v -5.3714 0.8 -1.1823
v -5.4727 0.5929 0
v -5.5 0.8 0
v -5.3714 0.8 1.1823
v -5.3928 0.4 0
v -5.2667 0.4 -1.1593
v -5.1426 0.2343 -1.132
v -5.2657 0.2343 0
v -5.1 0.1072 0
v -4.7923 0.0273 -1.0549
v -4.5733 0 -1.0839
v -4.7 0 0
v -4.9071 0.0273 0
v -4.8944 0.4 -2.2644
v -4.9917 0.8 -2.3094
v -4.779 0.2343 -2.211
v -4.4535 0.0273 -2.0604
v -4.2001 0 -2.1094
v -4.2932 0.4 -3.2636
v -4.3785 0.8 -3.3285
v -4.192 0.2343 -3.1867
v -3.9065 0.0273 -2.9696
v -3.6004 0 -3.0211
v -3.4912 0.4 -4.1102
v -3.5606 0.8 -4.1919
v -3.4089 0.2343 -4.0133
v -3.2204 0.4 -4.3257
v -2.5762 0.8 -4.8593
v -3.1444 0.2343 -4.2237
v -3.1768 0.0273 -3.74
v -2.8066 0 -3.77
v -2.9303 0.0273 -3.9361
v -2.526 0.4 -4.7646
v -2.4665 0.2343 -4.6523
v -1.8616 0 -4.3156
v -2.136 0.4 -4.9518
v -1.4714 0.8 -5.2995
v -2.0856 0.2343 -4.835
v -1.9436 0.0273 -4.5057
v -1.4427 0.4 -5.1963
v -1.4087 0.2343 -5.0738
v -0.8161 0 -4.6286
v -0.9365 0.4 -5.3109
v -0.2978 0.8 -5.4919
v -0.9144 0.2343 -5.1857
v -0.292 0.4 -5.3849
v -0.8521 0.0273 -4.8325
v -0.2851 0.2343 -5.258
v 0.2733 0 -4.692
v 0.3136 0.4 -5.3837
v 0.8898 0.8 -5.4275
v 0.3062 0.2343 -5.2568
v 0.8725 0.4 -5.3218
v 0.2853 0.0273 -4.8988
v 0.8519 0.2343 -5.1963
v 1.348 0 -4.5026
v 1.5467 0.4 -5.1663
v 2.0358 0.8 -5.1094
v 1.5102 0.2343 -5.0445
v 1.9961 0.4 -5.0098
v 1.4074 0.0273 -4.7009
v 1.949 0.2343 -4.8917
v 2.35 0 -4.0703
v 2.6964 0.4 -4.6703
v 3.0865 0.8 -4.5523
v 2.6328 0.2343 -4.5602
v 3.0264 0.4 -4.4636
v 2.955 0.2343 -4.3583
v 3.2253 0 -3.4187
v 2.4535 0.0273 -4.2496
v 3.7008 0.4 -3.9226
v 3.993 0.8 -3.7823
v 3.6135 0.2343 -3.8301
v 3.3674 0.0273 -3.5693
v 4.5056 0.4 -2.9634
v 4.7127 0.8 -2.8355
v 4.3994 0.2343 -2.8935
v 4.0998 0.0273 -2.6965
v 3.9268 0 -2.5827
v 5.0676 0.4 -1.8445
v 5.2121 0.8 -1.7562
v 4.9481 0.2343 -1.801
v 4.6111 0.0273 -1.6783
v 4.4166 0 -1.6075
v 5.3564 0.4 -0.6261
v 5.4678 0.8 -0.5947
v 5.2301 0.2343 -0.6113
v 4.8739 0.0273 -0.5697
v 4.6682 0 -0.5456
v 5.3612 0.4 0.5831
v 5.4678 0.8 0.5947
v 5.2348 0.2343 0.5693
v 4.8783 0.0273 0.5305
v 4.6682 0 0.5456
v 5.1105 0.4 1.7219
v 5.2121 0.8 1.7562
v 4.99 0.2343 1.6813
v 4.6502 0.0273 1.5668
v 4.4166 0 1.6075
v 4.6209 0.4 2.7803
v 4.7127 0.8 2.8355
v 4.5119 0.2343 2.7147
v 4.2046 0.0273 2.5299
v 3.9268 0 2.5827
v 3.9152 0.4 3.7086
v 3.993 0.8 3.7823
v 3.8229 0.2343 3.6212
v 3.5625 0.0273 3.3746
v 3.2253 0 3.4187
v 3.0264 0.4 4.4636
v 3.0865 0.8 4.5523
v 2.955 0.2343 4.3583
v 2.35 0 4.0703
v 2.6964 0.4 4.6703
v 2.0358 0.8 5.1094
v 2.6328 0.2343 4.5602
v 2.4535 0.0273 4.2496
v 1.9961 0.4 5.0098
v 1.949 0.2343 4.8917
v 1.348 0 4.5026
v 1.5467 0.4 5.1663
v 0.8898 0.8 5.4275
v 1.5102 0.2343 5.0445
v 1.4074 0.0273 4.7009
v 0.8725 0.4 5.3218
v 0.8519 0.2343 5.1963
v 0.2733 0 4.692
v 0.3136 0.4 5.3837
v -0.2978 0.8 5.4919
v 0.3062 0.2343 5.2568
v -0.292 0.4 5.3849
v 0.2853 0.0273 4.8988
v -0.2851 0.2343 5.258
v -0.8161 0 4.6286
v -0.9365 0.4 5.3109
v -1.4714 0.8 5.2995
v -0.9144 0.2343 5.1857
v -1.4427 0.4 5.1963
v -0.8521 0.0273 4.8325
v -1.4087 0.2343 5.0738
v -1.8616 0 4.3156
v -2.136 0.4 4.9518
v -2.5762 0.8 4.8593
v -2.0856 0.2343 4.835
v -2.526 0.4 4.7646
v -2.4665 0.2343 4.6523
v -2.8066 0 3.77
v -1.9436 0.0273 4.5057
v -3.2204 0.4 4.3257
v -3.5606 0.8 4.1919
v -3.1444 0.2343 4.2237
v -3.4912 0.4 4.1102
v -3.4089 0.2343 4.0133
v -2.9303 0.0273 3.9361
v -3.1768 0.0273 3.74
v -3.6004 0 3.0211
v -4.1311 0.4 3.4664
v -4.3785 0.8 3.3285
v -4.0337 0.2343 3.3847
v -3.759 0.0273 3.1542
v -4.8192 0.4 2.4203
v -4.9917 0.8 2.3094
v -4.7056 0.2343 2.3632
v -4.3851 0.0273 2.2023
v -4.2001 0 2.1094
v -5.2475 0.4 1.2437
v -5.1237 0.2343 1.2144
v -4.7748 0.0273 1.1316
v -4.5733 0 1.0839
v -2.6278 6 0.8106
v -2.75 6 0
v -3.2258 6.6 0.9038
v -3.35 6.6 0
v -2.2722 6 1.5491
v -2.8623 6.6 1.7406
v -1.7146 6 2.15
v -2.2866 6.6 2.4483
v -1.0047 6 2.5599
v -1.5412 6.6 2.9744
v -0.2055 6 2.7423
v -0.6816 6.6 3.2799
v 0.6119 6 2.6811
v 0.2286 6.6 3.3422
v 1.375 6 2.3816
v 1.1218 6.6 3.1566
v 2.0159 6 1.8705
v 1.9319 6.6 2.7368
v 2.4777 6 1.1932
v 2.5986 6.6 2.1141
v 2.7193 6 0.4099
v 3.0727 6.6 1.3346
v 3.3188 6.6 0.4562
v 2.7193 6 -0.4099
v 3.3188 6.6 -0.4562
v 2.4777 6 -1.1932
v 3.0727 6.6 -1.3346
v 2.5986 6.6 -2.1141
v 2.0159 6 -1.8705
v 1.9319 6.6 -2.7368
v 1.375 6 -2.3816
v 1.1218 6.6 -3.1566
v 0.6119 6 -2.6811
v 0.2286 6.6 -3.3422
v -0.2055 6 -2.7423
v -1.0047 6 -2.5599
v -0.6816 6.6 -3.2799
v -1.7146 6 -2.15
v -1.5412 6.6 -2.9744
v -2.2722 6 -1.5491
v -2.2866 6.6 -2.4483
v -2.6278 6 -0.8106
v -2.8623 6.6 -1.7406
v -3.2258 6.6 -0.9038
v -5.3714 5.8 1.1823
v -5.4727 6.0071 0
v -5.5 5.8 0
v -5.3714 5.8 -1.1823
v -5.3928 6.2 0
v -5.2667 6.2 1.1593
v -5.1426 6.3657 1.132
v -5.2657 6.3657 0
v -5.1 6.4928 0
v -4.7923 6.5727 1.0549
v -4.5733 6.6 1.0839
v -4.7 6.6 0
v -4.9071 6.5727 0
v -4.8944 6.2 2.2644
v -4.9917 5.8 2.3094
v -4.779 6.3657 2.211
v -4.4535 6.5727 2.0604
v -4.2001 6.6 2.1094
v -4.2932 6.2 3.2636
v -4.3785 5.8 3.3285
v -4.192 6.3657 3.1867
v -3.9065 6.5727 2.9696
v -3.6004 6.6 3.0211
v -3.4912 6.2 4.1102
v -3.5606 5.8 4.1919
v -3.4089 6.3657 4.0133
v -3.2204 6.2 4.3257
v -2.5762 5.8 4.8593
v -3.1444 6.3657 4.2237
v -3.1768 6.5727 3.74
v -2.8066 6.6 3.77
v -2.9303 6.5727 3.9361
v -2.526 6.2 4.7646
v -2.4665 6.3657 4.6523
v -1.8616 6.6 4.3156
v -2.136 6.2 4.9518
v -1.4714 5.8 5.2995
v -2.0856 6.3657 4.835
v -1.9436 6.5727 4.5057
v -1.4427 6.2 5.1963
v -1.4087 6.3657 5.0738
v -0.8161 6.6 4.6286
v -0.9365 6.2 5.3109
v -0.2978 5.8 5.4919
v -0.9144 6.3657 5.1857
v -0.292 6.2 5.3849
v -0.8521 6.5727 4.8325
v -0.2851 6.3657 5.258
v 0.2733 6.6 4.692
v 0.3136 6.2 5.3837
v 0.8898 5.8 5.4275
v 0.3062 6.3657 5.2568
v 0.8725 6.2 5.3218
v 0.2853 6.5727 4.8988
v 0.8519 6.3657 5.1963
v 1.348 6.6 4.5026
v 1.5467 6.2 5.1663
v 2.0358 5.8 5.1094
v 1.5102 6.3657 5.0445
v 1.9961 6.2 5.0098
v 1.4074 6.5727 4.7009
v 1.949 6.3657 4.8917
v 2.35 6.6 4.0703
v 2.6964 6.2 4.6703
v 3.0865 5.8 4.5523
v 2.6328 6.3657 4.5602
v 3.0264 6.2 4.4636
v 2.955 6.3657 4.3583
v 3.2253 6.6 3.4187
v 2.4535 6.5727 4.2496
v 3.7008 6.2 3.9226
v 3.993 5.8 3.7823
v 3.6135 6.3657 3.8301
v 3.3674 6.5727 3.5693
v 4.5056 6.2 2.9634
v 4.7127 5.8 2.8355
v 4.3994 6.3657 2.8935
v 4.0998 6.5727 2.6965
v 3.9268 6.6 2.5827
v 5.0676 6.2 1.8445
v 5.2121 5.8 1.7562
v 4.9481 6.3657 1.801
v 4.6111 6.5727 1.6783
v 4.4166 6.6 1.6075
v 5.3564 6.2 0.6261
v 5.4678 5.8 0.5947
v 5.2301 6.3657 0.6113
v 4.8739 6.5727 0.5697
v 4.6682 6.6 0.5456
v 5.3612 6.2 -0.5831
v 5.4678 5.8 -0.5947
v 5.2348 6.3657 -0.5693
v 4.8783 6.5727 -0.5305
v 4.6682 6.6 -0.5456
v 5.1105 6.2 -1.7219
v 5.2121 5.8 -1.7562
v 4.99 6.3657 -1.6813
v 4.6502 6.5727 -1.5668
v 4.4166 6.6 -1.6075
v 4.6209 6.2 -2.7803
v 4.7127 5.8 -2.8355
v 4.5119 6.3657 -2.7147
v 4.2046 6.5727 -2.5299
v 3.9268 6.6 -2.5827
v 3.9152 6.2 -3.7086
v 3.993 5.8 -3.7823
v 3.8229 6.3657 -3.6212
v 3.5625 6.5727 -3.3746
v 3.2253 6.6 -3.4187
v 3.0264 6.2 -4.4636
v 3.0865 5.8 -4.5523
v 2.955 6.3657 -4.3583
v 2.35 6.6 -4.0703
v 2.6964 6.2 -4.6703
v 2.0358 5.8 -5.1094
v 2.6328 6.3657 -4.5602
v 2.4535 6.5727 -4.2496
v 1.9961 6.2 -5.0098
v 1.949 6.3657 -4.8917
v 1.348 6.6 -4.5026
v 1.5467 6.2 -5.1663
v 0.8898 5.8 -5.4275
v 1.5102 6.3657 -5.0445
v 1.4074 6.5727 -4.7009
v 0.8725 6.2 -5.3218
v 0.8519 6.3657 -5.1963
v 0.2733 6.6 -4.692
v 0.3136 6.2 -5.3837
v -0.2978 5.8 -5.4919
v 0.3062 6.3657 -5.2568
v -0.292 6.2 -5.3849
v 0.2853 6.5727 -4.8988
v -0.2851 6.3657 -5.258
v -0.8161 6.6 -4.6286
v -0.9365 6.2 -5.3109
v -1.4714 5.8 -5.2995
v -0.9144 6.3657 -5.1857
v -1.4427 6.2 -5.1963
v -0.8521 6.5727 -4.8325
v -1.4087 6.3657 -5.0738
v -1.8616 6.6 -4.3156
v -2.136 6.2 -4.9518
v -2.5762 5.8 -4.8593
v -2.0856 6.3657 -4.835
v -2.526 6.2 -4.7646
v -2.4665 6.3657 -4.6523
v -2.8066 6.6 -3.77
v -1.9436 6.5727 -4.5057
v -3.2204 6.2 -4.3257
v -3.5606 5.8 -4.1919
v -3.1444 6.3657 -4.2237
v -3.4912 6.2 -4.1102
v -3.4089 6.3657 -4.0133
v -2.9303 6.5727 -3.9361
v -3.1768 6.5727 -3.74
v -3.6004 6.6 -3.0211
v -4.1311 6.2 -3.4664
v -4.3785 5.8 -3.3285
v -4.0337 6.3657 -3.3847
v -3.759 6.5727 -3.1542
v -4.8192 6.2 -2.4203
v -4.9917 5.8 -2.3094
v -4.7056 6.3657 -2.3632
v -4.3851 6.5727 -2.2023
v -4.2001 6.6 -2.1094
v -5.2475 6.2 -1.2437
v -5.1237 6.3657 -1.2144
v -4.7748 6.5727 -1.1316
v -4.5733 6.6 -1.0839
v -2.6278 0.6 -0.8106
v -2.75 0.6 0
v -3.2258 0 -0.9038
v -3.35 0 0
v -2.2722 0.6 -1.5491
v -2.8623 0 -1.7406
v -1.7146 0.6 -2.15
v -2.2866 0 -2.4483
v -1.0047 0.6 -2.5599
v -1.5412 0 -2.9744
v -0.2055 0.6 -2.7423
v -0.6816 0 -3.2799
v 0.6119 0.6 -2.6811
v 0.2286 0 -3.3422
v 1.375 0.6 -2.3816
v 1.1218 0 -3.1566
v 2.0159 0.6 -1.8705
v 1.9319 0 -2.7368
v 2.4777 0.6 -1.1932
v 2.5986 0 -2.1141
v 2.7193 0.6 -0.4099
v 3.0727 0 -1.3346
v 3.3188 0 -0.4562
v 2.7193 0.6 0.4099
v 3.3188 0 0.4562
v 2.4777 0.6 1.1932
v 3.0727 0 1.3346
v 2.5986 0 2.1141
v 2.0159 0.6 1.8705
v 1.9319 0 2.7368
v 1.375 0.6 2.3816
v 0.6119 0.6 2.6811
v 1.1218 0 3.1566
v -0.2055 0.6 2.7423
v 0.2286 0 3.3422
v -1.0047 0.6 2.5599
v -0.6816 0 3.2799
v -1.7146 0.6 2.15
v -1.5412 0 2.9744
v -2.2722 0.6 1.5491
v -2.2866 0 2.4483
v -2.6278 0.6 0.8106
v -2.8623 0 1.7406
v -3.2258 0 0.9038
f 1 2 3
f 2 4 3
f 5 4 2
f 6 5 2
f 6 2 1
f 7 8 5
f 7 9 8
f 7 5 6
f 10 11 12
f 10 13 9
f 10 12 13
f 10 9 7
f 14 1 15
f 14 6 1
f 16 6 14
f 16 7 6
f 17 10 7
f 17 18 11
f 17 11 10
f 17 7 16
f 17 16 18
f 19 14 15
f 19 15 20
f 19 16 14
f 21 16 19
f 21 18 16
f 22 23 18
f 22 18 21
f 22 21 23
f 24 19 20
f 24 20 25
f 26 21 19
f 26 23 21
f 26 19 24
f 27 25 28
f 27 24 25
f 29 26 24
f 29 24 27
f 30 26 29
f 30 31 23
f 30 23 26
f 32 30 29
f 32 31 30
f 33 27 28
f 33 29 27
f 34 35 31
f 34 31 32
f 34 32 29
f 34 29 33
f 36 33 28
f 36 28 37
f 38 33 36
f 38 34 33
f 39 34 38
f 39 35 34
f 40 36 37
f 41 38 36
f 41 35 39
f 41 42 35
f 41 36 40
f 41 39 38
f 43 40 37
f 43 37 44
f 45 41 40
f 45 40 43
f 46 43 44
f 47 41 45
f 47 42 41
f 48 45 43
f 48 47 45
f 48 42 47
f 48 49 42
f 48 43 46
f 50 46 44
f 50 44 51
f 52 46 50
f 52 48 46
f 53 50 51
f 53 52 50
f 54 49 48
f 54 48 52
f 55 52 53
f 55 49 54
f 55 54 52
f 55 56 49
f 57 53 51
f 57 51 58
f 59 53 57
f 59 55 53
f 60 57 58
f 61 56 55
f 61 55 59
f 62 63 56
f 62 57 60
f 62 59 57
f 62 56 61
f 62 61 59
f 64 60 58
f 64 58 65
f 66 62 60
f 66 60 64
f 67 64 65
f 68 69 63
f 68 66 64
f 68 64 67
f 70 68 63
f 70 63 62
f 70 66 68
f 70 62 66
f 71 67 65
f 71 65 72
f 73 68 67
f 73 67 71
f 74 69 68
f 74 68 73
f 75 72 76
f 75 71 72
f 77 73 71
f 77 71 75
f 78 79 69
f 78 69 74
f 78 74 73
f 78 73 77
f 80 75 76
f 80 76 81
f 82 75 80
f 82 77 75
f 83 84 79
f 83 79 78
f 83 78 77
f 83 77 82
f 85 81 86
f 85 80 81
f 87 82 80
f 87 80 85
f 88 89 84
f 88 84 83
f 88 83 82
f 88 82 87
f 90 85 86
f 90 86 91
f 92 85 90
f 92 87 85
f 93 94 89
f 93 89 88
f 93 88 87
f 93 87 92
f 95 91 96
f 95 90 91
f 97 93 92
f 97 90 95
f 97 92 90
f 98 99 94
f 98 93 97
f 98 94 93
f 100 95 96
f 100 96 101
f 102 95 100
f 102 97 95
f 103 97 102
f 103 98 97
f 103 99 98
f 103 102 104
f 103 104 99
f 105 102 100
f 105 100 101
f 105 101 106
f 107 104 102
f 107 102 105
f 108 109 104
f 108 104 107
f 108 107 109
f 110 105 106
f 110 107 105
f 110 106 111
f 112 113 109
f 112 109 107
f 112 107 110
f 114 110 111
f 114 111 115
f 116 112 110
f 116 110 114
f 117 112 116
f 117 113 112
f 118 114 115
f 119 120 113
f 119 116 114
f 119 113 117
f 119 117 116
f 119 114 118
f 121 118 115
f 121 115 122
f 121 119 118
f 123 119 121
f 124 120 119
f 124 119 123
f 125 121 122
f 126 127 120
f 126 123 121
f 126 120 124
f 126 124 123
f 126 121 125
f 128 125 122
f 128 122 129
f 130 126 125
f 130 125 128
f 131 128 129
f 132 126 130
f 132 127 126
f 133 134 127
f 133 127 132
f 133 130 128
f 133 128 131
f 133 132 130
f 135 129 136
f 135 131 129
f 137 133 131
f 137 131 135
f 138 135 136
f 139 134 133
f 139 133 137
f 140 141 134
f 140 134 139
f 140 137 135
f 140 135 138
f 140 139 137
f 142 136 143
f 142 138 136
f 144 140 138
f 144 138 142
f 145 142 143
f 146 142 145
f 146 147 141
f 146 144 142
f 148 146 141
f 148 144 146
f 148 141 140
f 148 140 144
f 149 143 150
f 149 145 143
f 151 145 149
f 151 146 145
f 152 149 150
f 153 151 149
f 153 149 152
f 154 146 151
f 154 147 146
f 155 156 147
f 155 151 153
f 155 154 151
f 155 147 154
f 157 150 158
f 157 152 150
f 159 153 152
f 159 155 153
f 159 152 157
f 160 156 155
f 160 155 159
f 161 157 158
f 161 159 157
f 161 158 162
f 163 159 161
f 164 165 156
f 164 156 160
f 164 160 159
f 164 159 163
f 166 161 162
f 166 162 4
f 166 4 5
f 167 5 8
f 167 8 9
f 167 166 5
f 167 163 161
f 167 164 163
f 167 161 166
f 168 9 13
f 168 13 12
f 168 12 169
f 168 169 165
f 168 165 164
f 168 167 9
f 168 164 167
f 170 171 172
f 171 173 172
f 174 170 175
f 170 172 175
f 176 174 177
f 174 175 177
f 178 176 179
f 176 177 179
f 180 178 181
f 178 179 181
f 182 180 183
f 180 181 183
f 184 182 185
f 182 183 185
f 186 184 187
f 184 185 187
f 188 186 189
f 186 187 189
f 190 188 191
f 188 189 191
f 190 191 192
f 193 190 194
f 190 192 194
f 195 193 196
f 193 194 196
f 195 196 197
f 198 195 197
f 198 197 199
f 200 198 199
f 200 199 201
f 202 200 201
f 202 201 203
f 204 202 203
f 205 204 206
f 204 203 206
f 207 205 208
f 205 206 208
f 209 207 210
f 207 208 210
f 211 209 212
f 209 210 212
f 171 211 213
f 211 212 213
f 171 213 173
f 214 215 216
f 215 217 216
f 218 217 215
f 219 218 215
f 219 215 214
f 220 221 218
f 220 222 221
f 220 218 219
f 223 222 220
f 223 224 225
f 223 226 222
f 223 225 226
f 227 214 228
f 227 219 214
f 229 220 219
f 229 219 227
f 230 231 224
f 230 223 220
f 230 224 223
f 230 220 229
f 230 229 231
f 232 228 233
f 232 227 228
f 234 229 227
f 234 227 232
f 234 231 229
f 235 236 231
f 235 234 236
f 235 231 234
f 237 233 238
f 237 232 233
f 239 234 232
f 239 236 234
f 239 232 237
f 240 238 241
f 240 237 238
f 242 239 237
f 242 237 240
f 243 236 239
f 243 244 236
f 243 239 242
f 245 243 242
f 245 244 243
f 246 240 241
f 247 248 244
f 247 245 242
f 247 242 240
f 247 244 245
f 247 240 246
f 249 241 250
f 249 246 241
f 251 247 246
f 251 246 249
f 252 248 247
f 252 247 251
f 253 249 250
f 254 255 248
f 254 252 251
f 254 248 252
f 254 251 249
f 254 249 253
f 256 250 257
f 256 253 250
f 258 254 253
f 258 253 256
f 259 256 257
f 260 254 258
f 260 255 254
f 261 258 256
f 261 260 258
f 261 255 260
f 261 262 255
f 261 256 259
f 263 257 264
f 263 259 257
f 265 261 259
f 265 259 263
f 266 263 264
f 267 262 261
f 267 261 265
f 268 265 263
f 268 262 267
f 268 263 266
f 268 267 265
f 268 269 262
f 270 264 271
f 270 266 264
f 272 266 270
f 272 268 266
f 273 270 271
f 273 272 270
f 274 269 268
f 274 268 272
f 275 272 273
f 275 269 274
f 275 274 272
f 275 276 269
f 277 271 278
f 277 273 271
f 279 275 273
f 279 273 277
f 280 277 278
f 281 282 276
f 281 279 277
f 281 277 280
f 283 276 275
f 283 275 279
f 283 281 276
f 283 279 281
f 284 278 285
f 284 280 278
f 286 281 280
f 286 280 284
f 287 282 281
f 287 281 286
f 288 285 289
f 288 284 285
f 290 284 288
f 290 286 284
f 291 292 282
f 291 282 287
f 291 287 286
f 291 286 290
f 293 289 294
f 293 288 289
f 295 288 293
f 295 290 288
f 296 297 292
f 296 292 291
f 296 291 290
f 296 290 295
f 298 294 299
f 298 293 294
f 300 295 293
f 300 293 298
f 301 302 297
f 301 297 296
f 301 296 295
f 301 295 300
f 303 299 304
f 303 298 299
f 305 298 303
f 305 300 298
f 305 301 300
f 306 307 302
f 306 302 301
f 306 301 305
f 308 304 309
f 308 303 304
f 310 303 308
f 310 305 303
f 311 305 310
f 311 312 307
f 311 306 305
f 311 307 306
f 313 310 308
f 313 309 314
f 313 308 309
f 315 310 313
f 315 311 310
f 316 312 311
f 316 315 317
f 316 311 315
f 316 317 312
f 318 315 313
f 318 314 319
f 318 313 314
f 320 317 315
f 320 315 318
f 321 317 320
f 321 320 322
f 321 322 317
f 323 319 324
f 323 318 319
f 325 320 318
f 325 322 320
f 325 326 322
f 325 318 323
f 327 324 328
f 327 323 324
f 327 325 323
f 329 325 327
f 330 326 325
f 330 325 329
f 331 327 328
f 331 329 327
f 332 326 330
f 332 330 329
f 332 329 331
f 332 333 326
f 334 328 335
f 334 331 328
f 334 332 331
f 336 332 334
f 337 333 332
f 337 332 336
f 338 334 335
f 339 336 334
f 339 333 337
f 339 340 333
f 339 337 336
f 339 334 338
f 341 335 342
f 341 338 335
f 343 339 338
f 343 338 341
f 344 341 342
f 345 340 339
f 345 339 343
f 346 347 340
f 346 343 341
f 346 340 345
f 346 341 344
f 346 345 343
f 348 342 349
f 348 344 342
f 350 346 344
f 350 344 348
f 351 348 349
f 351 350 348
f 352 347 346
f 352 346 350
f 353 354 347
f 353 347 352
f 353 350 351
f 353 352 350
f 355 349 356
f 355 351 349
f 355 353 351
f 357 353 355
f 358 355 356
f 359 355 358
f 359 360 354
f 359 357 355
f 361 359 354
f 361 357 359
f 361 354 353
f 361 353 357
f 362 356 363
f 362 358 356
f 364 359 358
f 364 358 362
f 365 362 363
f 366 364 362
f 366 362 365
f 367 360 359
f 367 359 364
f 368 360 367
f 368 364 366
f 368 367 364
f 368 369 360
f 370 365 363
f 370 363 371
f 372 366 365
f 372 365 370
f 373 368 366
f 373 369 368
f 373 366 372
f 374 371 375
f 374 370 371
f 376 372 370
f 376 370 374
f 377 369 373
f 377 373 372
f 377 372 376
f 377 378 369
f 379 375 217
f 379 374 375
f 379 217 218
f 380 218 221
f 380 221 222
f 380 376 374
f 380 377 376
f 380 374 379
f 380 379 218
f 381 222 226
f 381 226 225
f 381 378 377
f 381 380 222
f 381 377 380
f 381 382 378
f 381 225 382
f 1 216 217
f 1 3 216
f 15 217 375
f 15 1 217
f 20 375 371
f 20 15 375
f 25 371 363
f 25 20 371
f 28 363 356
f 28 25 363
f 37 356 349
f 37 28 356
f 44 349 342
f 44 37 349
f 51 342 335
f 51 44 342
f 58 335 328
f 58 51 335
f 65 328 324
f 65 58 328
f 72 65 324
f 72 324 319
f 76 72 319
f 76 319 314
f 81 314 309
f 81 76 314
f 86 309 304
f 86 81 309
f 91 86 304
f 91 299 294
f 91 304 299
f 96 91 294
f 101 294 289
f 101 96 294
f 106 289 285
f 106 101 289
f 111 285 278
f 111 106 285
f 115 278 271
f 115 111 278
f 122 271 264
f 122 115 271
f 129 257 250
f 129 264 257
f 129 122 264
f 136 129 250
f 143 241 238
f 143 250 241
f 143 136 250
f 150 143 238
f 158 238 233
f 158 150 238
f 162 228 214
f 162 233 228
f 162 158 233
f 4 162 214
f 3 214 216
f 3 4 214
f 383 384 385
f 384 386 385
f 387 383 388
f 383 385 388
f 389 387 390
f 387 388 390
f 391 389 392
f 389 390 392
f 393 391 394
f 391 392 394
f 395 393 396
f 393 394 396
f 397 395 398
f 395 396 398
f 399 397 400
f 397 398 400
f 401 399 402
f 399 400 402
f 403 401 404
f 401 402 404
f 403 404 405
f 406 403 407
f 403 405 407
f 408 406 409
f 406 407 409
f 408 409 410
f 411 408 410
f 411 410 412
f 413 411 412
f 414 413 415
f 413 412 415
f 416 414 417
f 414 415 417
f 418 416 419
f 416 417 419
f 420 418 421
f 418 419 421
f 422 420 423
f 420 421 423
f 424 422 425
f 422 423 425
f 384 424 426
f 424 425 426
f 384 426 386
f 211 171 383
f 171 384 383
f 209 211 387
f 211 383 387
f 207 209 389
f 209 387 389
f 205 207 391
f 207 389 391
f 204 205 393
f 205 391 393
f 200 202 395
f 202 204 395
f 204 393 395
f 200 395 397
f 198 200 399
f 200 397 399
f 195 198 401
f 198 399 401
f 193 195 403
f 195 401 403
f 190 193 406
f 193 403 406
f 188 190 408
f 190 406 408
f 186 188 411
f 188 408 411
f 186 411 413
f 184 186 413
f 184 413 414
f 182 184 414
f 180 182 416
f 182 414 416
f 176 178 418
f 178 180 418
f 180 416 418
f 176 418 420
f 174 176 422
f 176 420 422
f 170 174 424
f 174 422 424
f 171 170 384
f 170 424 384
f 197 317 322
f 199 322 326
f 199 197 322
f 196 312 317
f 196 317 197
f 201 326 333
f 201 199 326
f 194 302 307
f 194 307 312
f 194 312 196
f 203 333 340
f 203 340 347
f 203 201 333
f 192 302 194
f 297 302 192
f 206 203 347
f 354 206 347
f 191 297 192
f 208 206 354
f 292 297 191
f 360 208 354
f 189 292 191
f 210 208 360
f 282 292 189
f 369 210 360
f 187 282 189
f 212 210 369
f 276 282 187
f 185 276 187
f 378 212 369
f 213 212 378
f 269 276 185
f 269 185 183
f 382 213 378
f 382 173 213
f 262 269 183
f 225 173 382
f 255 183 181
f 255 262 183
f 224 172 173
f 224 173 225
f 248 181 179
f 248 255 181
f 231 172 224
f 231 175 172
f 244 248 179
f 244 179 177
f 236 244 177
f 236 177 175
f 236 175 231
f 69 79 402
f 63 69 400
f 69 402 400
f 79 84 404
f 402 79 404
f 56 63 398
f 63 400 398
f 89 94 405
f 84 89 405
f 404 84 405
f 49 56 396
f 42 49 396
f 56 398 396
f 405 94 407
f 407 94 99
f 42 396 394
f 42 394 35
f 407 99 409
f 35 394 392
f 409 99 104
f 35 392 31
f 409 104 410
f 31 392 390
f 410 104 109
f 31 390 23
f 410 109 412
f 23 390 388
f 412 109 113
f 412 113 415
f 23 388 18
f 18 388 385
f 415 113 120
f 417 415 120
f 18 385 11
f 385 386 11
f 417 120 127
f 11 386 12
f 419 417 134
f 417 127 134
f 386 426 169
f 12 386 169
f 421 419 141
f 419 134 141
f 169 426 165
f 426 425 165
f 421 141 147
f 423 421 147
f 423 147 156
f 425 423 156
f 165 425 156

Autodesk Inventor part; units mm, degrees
ref_plane "YZ Plane" through (0, 0, 0) normal (1, 0, 0) x (0, 1, 0)
ref_plane "XZ Plane" through (0, 0, 0) normal (0, 1, 0) x (-1, 0, 0)
ref_plane "XY Plane" through (0, 0, 0) normal (0, 0, 1) x (1, 0, 0)
sketch "Эскиз1" plane through (0, 0, 0) normal (0, 1, 0) x (-1, 0, 0)
  circle A0 centre (0, 0) radius 2.75
  circle A1 centre (0, 0) radius 5.5
  dimension "d0" = 5.5
  dimension "d1" = 11
extrude "Выдавливание1" add sketch "Эскиз1" along normal blind 6.6
fillet "Сопряжение1" radius 0.8 2 edges at (5.5, 6.6, 0) (5.5, 0, 0)
chamfer "Фаска1" distance 0.6 angle 45 2 edges at (2.75, 6.6, 0) (2.75, 0, 0)
properties part number "prostavka_6,6"
